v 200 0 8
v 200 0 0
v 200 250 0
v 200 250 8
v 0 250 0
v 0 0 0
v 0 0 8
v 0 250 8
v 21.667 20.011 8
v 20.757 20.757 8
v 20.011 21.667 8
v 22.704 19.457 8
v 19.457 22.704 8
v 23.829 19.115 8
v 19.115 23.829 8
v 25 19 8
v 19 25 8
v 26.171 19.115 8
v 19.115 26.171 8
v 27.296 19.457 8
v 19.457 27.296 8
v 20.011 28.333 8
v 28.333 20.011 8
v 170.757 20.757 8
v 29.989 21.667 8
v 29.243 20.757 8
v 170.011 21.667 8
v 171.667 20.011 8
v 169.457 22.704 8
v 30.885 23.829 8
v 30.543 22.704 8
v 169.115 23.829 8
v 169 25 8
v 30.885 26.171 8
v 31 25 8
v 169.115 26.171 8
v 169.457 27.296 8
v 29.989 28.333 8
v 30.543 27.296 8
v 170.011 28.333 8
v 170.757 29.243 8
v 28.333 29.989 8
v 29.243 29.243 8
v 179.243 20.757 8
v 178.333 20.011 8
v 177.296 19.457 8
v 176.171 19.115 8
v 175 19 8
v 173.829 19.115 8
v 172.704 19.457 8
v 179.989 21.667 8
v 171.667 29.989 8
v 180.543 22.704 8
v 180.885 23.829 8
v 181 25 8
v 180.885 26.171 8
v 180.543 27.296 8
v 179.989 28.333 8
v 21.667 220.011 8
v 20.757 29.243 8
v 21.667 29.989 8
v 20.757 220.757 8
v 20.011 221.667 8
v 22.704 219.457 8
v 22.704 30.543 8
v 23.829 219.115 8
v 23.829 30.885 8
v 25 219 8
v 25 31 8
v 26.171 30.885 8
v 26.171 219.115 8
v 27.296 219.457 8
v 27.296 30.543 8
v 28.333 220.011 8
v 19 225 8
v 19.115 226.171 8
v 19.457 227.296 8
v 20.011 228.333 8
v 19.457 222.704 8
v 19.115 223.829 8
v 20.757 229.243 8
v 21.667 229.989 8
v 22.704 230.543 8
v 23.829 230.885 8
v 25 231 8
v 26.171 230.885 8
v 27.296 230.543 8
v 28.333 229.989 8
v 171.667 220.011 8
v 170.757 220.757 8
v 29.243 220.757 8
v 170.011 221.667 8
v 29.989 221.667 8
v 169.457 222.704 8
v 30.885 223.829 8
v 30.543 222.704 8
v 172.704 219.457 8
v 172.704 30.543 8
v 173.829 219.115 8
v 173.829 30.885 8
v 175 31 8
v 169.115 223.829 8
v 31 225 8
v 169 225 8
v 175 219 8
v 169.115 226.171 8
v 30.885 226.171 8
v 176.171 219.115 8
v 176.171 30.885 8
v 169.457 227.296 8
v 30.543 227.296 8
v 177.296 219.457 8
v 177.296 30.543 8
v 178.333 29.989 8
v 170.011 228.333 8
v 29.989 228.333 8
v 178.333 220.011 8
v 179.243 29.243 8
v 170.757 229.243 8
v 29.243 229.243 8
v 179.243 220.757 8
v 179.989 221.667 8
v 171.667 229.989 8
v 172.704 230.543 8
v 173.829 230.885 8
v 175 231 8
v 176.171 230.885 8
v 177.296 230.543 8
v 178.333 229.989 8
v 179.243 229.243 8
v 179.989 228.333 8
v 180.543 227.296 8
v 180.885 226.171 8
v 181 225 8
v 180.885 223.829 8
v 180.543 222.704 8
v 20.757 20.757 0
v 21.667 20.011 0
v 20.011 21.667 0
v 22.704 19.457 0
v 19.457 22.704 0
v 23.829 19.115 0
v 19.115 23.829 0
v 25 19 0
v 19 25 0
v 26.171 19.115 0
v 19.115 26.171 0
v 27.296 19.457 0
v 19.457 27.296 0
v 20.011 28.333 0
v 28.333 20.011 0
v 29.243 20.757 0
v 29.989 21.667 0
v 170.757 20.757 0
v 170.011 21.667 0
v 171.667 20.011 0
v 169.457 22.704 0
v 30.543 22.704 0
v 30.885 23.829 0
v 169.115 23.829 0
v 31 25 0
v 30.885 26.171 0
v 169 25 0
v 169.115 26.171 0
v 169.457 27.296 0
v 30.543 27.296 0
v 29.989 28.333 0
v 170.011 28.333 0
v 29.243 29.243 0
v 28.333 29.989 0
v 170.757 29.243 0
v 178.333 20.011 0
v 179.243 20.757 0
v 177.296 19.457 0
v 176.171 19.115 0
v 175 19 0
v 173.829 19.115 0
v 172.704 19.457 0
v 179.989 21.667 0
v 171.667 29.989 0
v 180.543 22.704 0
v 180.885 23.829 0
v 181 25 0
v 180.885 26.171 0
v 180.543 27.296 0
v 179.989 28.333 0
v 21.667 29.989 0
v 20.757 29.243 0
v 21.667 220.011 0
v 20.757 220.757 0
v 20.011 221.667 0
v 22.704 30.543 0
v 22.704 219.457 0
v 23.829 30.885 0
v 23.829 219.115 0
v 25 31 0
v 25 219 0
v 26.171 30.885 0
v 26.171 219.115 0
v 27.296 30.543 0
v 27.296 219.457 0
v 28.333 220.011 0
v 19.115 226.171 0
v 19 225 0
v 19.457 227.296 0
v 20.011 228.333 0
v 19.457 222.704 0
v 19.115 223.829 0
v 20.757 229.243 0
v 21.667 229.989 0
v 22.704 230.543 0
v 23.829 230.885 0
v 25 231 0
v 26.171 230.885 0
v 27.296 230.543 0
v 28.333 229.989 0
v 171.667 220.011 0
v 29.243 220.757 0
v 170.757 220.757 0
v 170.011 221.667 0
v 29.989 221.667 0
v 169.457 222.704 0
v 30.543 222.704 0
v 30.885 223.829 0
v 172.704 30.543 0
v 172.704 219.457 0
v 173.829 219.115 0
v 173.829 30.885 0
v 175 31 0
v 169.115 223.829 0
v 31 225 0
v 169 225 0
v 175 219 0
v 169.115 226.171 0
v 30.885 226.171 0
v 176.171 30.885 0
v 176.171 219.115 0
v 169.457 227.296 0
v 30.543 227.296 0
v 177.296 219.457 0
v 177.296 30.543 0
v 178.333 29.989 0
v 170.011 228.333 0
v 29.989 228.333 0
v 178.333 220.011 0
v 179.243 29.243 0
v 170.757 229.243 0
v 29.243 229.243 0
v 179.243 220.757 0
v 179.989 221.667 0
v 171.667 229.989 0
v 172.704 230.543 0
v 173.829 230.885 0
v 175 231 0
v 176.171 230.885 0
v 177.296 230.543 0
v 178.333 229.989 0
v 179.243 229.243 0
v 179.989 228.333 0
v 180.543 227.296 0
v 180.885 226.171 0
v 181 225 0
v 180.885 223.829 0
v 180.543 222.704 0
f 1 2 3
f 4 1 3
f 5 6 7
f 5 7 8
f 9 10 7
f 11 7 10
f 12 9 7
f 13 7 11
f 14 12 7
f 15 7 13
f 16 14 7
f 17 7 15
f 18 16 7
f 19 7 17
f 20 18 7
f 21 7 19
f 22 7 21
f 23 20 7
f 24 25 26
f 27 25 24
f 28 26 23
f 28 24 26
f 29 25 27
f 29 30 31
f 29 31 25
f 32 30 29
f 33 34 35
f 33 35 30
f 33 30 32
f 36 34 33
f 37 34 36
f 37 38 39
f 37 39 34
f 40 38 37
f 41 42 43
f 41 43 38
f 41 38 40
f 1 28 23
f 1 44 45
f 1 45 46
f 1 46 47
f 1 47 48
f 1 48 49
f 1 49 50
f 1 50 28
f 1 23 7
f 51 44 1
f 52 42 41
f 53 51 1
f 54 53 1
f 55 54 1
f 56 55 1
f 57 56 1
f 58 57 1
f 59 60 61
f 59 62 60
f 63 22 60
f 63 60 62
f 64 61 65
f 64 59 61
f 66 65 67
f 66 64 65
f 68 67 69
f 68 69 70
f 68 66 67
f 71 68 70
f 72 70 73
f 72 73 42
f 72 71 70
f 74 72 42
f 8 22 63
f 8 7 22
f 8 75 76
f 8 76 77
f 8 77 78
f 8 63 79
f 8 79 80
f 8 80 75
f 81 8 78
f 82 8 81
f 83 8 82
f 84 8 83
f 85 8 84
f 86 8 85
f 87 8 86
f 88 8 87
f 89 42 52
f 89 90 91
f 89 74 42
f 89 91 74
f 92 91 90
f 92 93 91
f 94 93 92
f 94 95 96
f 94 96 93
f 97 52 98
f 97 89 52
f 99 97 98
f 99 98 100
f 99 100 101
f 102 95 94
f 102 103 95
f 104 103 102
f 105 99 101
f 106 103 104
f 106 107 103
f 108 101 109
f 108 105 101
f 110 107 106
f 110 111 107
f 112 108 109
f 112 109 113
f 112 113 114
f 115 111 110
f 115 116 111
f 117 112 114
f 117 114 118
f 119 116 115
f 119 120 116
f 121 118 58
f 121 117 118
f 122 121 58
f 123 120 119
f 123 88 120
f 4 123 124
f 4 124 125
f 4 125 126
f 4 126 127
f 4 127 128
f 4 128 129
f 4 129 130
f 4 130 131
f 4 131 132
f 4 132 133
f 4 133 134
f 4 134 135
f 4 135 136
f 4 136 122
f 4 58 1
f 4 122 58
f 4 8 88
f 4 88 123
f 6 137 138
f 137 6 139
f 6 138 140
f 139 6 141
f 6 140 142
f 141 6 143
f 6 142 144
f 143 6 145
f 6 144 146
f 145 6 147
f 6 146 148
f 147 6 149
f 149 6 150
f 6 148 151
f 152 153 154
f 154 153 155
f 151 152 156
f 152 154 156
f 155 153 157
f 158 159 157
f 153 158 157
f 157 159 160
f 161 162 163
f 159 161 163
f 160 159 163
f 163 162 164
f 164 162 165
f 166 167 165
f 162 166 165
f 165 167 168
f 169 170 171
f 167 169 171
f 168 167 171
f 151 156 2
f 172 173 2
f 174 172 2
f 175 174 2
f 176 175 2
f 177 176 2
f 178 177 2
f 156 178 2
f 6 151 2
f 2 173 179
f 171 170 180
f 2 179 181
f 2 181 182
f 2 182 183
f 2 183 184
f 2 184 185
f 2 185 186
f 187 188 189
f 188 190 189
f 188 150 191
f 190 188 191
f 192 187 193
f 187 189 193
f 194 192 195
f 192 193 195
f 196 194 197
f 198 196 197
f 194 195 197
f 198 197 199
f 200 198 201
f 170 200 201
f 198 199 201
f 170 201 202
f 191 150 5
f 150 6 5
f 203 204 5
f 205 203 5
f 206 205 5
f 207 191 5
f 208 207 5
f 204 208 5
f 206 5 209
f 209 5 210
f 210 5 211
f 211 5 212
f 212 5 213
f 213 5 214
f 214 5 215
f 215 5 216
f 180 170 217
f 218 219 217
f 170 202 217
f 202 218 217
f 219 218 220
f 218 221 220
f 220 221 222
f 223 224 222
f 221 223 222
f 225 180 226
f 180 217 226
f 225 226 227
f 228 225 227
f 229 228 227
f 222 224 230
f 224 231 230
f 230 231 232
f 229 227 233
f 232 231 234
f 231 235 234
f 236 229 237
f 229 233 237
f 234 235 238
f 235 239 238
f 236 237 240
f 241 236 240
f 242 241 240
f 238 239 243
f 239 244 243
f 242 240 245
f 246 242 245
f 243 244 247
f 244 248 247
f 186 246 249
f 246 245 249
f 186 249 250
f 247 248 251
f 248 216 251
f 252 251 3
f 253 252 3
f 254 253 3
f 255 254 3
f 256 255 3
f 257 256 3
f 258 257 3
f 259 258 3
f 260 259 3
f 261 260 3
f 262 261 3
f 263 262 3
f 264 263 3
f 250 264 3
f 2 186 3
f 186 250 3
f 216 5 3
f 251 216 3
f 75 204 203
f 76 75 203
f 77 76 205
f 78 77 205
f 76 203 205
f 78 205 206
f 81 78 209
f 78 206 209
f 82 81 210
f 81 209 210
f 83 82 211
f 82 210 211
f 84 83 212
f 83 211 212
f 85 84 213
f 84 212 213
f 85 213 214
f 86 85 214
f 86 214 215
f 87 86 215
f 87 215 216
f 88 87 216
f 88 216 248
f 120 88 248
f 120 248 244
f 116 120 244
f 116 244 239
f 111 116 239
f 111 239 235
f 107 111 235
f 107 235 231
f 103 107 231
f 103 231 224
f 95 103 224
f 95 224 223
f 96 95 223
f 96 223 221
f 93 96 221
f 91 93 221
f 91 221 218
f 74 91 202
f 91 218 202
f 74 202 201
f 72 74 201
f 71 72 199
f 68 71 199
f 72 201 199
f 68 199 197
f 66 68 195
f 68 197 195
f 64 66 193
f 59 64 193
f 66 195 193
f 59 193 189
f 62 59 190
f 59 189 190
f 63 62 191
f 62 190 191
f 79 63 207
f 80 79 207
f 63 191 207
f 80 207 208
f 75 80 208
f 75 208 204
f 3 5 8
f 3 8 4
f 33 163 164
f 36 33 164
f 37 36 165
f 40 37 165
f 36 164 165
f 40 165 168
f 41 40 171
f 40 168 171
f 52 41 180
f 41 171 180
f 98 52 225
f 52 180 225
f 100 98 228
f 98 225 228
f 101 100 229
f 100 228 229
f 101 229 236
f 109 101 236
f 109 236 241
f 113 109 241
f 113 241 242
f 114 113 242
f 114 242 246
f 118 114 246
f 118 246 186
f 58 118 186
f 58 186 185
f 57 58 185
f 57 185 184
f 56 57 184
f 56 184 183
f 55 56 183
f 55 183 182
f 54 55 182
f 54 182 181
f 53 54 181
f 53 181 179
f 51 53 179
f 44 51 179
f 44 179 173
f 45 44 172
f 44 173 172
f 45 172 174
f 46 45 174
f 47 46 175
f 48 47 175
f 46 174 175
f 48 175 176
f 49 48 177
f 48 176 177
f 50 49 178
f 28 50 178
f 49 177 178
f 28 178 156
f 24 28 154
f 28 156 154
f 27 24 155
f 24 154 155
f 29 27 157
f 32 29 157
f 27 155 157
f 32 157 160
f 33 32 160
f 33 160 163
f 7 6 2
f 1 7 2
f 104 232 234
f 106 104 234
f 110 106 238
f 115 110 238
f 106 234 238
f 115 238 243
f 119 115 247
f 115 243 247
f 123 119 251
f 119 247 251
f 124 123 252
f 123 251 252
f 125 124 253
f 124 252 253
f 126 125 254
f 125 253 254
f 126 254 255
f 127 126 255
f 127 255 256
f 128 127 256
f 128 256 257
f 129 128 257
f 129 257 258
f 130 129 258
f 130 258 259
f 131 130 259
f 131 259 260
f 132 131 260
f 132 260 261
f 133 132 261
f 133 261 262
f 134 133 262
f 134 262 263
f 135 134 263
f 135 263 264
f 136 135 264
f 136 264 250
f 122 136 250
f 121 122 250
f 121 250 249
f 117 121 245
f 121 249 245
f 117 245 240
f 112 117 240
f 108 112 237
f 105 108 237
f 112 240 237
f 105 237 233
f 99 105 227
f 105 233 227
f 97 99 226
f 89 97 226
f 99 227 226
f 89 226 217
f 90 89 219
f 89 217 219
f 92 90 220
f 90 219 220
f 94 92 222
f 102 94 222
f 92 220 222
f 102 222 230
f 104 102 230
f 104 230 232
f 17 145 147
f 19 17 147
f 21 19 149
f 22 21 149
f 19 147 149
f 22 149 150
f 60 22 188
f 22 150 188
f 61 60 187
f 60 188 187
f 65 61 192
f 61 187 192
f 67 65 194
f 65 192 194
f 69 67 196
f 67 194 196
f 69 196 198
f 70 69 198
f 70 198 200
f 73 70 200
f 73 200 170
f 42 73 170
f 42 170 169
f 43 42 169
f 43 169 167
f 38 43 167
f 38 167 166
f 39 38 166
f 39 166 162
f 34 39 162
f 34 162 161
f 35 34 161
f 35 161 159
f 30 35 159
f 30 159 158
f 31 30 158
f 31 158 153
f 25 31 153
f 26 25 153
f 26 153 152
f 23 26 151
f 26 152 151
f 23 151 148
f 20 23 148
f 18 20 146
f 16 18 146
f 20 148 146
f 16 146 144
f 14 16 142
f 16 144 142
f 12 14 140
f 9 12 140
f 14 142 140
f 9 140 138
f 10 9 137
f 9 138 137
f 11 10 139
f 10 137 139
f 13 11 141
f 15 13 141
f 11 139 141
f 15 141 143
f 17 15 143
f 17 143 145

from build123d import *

# Parameters (mm, degrees)
F0_W     = 200
F0_H     = 250
F1_DEPTH = 8
F3_D     = 12


with BuildPart() as f1:
    # F0 (on Top) → F1 (new body)
    with BuildSketch(Plane.XY):
        with Locations((100, 125)):
            Rectangle(F0_W, F0_H)
    extrude(amount=F1_DEPTH)

    # F3 (through all)
    with Locations(Plane.XY.offset(8)):
        with Locations((25, 225), (25, 25), (175, 225), (175, 225), (175, 25)):
            Hole(F3_D / 2)


solid = f1.part
